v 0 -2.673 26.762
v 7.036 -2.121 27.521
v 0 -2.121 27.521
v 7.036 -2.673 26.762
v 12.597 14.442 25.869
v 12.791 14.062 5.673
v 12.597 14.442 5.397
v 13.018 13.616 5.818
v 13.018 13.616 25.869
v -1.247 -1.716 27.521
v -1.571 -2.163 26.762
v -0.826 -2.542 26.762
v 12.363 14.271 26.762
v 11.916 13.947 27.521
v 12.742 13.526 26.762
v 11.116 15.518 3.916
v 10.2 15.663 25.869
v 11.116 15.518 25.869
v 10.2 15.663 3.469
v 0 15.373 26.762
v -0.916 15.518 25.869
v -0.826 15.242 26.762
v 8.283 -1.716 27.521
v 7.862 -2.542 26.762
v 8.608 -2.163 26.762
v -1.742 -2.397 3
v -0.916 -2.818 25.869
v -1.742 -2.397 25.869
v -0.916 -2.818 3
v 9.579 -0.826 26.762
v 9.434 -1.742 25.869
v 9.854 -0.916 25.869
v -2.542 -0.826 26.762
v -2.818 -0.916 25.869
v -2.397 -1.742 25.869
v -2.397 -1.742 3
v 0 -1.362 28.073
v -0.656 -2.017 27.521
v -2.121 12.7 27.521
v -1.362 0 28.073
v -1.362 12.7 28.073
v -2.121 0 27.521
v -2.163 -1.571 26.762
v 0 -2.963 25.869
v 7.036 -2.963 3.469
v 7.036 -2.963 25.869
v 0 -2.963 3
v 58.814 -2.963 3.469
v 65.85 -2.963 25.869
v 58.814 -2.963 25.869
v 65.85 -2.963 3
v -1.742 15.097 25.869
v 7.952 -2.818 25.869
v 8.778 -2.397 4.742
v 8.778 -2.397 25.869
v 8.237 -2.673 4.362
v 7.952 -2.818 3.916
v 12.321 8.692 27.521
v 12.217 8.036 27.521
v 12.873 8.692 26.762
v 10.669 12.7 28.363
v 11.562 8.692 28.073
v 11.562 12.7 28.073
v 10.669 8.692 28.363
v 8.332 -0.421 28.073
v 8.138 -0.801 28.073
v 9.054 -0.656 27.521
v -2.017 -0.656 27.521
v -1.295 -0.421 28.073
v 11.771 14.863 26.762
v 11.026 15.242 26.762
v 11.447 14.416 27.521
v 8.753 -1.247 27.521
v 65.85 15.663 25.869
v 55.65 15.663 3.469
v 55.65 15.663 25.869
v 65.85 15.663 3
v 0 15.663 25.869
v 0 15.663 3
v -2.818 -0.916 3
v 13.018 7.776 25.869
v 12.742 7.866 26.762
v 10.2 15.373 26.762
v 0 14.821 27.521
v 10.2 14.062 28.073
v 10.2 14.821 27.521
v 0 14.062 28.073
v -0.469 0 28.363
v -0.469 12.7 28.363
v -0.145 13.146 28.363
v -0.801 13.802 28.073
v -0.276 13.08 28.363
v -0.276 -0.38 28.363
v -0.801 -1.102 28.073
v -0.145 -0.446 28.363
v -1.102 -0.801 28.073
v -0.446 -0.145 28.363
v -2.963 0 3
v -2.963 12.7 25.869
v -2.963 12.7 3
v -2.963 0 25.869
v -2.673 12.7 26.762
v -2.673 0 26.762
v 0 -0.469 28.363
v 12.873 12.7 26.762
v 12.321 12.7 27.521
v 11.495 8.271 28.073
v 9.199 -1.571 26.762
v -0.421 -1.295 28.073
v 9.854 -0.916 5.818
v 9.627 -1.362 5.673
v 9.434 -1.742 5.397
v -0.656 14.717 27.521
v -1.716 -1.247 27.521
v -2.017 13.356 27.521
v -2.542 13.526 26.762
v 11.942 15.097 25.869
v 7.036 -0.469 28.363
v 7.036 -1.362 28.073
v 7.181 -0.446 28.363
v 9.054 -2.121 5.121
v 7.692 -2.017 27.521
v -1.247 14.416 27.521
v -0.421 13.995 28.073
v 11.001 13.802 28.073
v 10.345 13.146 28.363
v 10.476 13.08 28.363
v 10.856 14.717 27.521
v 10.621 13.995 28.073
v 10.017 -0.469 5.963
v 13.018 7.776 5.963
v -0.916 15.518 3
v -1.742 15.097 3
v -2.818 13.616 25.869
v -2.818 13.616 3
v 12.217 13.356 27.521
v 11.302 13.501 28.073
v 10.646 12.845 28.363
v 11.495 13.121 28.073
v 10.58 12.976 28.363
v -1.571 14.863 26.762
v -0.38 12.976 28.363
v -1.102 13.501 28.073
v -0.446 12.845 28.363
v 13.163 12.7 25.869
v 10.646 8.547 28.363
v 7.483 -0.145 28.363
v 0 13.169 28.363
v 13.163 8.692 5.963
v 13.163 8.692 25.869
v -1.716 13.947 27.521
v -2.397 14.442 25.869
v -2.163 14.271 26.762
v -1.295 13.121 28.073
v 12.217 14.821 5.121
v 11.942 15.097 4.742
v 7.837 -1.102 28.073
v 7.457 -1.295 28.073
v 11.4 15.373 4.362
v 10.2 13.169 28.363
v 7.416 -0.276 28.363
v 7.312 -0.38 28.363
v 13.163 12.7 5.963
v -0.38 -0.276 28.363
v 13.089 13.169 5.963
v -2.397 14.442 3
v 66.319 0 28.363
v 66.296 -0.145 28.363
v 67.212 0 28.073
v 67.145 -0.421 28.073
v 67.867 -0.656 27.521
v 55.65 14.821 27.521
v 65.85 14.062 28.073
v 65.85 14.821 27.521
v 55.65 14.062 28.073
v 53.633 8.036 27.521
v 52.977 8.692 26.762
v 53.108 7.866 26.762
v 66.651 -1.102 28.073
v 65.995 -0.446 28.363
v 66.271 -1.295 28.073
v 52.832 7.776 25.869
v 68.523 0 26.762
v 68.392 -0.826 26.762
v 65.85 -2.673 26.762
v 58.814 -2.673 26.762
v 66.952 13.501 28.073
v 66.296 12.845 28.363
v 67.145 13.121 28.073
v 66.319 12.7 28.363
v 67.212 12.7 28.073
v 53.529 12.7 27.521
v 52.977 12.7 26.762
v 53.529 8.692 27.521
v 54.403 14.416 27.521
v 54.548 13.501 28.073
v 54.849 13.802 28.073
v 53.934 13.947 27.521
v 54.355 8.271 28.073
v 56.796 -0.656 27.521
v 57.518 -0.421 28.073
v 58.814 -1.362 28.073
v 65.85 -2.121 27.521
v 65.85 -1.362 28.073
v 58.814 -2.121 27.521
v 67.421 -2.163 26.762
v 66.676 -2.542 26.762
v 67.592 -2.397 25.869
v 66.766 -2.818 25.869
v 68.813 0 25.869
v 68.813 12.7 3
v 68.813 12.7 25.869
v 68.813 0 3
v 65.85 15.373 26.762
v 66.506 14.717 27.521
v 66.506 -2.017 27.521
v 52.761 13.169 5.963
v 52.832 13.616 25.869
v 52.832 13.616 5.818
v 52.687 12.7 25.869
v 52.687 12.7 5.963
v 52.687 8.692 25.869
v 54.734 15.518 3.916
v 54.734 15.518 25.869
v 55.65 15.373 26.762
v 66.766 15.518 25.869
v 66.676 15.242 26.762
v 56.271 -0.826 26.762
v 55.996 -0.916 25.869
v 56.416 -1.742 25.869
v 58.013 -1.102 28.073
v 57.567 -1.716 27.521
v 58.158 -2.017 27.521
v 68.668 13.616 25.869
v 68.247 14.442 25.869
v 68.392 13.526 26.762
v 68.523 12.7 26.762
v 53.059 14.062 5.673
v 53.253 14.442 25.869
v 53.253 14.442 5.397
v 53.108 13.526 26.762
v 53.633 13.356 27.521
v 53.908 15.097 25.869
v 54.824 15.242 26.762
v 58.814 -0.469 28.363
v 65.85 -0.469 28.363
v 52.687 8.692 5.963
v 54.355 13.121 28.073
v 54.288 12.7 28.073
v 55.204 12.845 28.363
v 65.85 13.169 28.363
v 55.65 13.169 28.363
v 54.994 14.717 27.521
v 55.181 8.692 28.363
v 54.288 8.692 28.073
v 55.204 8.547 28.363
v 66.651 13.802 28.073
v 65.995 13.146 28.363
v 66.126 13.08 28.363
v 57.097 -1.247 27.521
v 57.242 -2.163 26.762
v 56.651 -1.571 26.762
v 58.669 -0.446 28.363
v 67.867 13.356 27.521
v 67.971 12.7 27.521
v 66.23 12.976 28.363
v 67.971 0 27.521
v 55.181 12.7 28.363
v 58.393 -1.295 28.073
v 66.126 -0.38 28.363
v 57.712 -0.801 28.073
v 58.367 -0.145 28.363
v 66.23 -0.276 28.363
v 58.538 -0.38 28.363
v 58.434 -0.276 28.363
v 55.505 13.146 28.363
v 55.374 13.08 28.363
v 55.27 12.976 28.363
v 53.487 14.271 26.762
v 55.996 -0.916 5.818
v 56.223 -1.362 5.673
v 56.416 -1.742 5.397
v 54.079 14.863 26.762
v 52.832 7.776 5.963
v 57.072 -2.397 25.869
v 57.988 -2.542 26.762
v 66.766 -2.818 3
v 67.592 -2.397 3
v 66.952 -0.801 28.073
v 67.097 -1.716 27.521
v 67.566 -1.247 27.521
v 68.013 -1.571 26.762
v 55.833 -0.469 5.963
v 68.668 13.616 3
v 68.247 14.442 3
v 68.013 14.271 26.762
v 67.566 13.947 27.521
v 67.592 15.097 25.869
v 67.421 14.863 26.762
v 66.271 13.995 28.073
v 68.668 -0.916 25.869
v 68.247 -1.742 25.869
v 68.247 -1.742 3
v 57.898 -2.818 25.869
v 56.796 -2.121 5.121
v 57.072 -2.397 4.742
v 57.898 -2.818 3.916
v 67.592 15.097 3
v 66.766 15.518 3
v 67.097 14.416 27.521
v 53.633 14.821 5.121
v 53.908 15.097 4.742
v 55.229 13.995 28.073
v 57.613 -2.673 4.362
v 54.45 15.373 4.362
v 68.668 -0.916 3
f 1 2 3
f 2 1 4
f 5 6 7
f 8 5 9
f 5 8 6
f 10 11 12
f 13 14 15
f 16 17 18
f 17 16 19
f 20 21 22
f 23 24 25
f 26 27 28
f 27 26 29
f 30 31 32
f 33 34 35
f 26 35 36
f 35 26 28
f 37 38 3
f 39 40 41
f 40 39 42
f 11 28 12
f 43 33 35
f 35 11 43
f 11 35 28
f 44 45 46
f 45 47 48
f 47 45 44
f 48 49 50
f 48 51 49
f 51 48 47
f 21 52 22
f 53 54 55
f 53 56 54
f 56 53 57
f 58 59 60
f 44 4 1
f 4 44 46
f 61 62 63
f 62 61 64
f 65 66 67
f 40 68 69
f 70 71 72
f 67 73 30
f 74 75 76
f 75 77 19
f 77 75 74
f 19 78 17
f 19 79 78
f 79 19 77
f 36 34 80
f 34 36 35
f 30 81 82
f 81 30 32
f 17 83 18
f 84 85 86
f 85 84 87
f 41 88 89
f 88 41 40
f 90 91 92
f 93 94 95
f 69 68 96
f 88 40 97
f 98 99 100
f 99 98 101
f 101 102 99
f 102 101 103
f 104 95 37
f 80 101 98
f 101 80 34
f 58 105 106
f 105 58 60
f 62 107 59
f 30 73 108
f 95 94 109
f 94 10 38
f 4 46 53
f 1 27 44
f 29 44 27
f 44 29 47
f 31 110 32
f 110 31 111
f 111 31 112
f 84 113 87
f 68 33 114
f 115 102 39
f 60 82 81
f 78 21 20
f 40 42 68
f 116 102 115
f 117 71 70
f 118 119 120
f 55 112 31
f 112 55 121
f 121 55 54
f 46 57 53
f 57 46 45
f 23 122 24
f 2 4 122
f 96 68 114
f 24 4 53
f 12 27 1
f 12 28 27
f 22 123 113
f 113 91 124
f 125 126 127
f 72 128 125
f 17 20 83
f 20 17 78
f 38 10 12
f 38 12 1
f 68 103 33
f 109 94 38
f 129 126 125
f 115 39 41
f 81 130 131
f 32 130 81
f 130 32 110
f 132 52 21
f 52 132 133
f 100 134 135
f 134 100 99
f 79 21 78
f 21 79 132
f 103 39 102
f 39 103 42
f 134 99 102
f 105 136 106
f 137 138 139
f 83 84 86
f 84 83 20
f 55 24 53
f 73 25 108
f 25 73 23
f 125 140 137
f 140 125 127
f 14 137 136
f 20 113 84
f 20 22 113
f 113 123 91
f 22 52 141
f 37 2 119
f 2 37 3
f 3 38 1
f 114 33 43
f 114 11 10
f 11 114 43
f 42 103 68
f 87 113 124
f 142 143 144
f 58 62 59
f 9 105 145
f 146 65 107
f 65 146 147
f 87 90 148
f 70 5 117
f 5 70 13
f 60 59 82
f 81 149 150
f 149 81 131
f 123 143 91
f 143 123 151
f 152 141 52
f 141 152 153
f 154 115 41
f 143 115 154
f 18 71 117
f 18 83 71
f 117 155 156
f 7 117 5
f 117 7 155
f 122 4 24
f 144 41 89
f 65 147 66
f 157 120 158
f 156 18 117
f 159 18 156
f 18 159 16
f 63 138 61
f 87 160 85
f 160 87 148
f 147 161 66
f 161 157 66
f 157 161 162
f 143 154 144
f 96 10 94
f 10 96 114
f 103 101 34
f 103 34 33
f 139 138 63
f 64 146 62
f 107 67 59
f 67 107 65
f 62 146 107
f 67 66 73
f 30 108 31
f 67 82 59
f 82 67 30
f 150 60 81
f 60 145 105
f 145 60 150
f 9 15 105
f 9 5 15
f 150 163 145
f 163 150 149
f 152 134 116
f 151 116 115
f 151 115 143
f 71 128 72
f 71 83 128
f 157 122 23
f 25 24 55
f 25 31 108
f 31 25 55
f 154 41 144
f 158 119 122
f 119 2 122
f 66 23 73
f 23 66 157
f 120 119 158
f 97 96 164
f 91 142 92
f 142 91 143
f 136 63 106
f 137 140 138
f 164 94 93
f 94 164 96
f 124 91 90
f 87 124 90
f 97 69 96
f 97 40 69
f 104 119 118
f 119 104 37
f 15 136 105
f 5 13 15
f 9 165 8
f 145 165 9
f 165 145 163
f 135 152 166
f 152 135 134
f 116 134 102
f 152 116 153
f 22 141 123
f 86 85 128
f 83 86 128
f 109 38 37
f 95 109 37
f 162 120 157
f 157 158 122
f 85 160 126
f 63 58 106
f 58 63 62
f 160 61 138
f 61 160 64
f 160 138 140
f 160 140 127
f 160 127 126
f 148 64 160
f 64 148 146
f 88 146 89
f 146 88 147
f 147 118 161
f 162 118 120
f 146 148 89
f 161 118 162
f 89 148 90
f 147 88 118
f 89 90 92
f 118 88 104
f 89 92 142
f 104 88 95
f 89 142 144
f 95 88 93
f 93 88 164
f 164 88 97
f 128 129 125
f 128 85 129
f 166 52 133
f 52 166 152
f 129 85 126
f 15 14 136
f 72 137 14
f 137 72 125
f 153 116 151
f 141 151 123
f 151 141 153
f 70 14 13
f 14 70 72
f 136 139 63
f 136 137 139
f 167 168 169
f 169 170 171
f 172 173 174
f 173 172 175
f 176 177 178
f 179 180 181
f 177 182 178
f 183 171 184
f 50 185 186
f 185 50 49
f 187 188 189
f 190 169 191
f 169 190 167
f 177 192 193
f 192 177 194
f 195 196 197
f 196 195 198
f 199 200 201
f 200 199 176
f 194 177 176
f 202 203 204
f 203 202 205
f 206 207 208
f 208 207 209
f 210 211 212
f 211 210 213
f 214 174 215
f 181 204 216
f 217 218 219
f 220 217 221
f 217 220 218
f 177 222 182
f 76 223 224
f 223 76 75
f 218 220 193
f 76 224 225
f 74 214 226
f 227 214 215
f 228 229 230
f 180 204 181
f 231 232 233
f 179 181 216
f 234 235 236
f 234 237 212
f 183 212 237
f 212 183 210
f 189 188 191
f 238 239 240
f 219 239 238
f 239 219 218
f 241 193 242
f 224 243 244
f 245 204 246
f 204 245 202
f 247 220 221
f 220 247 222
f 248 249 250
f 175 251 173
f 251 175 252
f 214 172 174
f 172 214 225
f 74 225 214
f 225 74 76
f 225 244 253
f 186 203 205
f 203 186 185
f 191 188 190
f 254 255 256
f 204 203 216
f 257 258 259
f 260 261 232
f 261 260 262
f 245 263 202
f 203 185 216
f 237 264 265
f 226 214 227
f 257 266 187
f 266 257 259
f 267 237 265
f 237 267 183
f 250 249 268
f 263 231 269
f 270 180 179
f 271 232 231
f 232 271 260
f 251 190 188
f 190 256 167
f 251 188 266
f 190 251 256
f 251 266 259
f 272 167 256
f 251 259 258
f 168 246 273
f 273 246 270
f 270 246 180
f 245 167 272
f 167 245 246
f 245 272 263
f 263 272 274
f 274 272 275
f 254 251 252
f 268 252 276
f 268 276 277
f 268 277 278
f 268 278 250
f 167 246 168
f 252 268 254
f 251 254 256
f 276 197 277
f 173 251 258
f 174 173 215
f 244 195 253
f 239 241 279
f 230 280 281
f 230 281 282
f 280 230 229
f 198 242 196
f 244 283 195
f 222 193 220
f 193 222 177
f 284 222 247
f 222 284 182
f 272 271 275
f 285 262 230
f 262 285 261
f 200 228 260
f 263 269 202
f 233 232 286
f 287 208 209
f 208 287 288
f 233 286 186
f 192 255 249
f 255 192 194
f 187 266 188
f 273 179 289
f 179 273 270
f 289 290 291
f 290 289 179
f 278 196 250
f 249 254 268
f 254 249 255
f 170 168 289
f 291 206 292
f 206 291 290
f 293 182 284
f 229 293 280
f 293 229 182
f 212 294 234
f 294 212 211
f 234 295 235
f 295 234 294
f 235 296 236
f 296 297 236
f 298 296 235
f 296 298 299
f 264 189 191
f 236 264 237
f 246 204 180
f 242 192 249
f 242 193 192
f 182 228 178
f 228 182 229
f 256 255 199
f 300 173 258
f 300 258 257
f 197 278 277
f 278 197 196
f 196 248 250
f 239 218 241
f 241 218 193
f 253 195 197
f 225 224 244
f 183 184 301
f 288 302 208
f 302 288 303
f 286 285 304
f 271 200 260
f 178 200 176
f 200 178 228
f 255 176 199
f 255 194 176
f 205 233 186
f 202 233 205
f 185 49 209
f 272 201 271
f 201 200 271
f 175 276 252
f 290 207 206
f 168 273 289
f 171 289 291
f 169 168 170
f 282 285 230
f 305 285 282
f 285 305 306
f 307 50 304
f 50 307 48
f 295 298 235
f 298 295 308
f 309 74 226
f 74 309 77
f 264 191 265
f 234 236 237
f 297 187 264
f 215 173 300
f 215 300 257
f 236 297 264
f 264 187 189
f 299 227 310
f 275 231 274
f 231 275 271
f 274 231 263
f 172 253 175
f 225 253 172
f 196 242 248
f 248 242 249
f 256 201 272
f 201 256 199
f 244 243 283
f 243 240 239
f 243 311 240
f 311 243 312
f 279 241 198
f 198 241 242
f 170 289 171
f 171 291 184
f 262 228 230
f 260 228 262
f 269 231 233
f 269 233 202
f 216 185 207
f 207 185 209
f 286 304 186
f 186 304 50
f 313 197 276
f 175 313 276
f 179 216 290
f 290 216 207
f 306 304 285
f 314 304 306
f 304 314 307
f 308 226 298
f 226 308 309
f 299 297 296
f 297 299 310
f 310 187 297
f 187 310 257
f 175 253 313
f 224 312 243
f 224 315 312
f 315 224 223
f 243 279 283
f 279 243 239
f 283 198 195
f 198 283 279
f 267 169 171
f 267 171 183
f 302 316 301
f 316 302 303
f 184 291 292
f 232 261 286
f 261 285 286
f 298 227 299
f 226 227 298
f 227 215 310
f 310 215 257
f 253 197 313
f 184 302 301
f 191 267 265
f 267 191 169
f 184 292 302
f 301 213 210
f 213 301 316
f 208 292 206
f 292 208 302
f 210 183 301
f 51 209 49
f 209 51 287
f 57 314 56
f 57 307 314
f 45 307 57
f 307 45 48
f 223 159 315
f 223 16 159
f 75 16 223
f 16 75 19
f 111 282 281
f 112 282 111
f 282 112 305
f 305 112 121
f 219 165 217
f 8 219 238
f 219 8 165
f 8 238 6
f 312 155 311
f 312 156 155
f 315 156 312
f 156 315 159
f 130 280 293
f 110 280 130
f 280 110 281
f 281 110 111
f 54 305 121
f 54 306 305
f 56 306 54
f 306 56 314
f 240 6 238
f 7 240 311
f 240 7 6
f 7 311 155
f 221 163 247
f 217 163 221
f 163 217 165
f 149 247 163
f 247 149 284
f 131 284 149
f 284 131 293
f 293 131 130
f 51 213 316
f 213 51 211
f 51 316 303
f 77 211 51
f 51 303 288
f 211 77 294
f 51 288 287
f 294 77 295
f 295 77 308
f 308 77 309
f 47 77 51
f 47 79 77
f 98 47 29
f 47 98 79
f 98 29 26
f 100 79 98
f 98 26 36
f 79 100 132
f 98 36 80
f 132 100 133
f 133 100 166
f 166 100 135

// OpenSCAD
intersection() {
  translate([-5,-5,3]) cube([80,60,50]);
minkowski()
  //union()
  {
  hardsides();
  sphere(r=3,$fn=20);
}
}
*translate([inch(2.75)/2-inch(1.5)/2,0]) cube([inch(1.5),inch(10),inch(10)]);
module hardsides() {
difference() {
  cube([inch(2.75)-4,inch(.5),inch(1)]);
  translate([inch(2.75)/2-inch(1.75)/2-2.5,-.1,3]) cube([inch(1.75)+1,inch(.5)+.2,inch(2)]);
  translate([inch(2.75)/2-2,0]) for(m=[0,1]) mirror([m,0]) translate([-.5*inch(2.75),0])
    translate([9,-.1,3]) rotate([0,0,-20]) cube([10,60,40]);
}
}
/*translate([-4,-14,-4]) cube([28,48,4]);
minkowski()
{
difference() {
  cube([20,20,50]);
  translate([0,10]) for(m=[0,1]) mirror([0,m]) translate([0,-10])
  translate([18,-.1,-.1]) rotate([0,0,70]) mirror([0,0]) mirror([1,0]) cube([50,50,50]);
  translate([-.1,-.1,35]) rotate([0,-40]) cube(50);
  translate([20,-.1,10]) rotate([0,-10]) cube(50);
}
  sphere(4,$fn=20);
}*/
function inch(num) = num * 25.4;
